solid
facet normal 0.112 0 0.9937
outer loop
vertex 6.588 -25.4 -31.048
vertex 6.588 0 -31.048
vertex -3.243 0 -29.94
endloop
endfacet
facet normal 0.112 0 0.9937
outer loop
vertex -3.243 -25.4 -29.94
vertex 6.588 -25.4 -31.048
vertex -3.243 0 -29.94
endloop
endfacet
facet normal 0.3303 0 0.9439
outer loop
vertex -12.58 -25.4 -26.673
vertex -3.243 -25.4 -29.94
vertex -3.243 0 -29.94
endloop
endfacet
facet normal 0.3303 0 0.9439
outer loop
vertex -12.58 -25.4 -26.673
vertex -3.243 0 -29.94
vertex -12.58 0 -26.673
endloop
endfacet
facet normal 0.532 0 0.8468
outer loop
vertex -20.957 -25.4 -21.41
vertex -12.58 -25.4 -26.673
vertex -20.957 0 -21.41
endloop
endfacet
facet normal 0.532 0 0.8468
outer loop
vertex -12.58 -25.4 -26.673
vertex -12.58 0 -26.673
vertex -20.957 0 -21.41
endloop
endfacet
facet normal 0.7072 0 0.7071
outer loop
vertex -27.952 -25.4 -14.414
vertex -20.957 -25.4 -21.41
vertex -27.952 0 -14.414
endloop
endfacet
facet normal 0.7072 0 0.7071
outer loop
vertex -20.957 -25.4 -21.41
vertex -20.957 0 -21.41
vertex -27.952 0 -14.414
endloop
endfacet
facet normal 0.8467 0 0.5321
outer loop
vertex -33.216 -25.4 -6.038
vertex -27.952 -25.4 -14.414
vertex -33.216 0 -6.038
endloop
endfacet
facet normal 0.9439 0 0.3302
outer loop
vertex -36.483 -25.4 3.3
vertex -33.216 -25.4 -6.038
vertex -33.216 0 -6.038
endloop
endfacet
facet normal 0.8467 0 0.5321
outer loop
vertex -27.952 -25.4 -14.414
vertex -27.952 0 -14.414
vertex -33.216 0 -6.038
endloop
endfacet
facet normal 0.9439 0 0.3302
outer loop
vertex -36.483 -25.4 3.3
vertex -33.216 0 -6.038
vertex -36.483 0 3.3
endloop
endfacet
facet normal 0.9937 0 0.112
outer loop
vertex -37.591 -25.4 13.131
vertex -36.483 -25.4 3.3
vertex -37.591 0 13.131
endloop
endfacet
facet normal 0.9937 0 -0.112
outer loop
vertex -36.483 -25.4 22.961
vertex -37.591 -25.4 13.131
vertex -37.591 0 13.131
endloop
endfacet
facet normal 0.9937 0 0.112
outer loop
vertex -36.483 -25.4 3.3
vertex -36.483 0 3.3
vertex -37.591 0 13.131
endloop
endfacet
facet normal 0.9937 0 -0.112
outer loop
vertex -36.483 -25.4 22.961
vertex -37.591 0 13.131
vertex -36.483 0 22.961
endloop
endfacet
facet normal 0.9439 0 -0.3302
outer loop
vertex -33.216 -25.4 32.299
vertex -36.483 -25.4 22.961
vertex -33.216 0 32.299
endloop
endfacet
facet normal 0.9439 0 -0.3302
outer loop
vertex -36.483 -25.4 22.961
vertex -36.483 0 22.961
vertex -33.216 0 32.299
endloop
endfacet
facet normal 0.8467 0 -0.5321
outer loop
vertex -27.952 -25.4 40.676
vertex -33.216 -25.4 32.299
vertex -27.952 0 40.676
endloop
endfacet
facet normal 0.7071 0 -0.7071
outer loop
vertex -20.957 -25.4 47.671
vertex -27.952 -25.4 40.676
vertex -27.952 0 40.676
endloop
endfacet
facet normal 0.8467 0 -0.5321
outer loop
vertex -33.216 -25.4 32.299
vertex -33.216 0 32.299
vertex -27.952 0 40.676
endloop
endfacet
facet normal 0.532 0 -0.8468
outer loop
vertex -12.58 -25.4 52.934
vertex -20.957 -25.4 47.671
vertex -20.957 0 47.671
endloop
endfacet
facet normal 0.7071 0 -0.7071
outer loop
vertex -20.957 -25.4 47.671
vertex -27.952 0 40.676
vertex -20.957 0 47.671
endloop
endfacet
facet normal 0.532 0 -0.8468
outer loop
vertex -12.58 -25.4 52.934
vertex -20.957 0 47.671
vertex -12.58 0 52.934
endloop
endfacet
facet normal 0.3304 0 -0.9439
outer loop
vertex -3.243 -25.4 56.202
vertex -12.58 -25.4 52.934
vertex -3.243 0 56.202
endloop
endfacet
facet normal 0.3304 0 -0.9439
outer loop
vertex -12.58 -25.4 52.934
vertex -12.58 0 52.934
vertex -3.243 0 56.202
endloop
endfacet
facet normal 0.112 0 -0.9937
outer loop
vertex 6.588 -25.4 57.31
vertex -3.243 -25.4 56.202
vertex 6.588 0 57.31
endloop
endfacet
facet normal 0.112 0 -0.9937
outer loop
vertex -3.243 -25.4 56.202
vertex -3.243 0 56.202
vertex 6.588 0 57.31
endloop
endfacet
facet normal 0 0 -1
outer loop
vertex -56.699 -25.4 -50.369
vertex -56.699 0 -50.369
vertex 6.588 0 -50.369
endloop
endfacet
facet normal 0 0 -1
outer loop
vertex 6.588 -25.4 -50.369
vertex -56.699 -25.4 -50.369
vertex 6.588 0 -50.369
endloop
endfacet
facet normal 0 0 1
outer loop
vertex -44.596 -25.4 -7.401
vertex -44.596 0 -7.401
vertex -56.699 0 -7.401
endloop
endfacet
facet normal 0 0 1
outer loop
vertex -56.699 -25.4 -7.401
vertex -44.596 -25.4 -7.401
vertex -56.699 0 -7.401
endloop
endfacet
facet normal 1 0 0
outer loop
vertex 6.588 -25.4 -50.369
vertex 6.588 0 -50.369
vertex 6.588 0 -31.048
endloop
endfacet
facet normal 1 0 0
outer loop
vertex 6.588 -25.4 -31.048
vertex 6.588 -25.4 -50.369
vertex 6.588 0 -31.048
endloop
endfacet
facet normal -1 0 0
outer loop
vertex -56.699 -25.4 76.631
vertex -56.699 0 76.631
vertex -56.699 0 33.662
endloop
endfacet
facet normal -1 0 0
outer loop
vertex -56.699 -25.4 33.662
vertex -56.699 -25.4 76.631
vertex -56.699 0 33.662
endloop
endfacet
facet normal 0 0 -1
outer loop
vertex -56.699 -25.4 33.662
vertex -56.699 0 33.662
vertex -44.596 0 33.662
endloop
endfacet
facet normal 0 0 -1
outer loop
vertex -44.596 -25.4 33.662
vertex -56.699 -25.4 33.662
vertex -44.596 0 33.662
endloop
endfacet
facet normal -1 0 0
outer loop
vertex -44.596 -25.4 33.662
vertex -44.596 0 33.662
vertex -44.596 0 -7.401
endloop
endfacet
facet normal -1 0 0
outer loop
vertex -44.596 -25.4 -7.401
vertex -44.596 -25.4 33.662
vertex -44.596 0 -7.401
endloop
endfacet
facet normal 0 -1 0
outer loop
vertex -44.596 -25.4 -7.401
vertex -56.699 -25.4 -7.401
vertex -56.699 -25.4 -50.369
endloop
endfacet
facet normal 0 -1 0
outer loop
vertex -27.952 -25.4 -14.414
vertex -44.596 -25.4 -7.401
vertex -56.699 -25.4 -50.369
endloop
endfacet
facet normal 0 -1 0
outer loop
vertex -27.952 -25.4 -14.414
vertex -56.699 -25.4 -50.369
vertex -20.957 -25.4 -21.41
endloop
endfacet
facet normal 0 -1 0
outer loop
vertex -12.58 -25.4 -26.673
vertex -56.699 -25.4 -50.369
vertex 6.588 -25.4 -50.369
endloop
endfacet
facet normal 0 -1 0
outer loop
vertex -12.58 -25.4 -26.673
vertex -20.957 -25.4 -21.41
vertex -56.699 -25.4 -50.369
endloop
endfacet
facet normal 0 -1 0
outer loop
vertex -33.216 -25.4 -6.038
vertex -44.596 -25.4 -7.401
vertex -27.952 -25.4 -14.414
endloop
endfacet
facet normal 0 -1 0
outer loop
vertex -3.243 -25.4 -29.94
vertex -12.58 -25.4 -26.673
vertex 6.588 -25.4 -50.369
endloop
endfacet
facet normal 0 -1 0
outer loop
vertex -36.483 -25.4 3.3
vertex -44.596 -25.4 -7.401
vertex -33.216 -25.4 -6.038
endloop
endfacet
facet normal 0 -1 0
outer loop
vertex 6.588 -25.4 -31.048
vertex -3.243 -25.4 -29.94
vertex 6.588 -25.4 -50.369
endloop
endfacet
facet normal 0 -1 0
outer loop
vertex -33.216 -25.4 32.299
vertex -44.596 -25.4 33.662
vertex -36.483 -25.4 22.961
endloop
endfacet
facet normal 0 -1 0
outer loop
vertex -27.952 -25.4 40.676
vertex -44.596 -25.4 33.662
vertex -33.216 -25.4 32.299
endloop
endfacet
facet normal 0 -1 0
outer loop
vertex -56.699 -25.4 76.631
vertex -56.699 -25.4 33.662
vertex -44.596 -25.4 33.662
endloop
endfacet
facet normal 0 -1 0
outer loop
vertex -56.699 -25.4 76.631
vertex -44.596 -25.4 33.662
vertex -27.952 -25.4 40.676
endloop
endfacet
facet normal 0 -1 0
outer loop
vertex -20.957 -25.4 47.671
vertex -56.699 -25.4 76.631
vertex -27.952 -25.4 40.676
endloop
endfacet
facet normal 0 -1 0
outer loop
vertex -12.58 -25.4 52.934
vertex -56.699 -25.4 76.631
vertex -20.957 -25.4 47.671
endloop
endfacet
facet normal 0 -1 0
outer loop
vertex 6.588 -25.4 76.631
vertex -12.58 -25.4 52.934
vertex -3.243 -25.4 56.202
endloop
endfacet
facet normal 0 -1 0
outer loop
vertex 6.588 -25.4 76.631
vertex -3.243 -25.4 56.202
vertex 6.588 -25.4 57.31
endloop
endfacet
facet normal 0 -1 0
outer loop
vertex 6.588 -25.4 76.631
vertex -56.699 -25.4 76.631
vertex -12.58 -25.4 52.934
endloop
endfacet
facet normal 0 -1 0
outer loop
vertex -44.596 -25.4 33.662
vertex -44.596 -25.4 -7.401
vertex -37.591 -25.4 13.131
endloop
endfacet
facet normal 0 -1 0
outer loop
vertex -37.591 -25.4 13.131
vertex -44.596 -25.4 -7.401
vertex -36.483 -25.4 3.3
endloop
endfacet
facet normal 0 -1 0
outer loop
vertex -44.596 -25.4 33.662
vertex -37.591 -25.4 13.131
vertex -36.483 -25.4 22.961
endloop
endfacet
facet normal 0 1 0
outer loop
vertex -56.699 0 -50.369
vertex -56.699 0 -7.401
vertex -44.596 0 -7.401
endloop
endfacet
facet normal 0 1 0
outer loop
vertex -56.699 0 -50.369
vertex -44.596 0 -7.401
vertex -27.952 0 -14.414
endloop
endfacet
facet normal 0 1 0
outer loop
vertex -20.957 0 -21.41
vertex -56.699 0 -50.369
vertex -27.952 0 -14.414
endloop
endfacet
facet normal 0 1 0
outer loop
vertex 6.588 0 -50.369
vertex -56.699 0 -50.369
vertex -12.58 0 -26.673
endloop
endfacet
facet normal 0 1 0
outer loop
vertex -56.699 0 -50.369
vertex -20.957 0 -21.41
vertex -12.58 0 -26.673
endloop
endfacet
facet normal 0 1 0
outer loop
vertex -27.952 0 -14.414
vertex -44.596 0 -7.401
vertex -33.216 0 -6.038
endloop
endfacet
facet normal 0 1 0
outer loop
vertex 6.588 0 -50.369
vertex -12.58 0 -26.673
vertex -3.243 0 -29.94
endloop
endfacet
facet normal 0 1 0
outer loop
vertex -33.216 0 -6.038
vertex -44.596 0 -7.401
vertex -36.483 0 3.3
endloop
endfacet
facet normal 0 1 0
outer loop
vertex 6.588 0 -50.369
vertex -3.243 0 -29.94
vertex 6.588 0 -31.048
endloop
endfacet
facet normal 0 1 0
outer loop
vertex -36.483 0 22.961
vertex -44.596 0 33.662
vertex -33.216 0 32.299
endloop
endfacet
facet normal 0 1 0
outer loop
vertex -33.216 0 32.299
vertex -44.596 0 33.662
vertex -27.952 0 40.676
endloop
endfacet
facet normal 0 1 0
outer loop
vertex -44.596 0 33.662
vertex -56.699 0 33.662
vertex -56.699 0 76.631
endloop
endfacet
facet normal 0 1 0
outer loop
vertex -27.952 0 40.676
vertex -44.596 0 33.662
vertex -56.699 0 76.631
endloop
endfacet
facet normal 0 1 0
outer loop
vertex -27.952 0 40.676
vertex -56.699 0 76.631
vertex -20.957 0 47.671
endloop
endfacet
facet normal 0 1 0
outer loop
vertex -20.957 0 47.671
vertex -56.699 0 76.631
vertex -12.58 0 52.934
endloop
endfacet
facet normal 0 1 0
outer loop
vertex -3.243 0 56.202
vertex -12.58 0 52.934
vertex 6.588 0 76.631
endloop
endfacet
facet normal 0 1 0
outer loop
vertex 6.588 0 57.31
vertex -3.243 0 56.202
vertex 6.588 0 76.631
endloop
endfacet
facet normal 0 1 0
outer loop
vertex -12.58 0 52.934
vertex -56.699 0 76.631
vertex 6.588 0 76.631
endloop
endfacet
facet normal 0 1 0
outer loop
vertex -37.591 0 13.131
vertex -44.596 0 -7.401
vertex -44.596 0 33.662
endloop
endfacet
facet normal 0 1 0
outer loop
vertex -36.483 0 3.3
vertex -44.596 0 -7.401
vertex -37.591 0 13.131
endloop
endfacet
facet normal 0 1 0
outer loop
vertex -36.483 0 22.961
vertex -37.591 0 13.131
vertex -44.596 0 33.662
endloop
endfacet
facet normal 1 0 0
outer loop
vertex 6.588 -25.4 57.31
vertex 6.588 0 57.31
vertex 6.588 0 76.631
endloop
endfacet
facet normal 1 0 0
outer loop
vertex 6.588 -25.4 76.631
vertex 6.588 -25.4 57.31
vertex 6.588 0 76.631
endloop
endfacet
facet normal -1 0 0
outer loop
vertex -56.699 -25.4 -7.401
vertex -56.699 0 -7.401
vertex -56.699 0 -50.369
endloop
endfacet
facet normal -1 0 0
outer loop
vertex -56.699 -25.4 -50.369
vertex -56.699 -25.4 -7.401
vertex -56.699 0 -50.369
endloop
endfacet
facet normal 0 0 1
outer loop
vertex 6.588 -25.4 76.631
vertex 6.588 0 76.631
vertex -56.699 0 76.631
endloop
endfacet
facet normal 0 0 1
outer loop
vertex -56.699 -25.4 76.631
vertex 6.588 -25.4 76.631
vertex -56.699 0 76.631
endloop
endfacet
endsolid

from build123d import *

# Parameters (mm, degrees)
F1_DEPTH = 25.4


with BuildPart() as f1:
    # F0 (on Front) → F1 (new body)
    with BuildSketch(Plane.XZ):
        with BuildLine():
            Line((6.587991, 76.630748), (-56.699019, 76.630748))
            Line((-56.699019, 76.630748), (-56.699019, 33.66233))
            Line((-56.699019, 33.66233), (-44.595942, 33.66233))
            Line((-44.595942, 33.66233), (-44.595942, -7.400833))
            Line((-44.595942, -7.400833), (-56.699019, -7.400833))
            Line((-56.699019, -7.400833), (-56.699019, -50.369252))
            Line((-56.699019, -50.369252), (6.587991, -50.369252))
            Line((6.587991, -50.369252), (6.587991, -31.048073))
            ThreePointArc((6.587991, -31.048073), (-37.59083, 13.130748), (6.587991, 57.30957))
            Line((6.587991, 57.30957), (6.587991, 76.630748))
        make_face()
    extrude(amount=F1_DEPTH)


solid = f1.part
